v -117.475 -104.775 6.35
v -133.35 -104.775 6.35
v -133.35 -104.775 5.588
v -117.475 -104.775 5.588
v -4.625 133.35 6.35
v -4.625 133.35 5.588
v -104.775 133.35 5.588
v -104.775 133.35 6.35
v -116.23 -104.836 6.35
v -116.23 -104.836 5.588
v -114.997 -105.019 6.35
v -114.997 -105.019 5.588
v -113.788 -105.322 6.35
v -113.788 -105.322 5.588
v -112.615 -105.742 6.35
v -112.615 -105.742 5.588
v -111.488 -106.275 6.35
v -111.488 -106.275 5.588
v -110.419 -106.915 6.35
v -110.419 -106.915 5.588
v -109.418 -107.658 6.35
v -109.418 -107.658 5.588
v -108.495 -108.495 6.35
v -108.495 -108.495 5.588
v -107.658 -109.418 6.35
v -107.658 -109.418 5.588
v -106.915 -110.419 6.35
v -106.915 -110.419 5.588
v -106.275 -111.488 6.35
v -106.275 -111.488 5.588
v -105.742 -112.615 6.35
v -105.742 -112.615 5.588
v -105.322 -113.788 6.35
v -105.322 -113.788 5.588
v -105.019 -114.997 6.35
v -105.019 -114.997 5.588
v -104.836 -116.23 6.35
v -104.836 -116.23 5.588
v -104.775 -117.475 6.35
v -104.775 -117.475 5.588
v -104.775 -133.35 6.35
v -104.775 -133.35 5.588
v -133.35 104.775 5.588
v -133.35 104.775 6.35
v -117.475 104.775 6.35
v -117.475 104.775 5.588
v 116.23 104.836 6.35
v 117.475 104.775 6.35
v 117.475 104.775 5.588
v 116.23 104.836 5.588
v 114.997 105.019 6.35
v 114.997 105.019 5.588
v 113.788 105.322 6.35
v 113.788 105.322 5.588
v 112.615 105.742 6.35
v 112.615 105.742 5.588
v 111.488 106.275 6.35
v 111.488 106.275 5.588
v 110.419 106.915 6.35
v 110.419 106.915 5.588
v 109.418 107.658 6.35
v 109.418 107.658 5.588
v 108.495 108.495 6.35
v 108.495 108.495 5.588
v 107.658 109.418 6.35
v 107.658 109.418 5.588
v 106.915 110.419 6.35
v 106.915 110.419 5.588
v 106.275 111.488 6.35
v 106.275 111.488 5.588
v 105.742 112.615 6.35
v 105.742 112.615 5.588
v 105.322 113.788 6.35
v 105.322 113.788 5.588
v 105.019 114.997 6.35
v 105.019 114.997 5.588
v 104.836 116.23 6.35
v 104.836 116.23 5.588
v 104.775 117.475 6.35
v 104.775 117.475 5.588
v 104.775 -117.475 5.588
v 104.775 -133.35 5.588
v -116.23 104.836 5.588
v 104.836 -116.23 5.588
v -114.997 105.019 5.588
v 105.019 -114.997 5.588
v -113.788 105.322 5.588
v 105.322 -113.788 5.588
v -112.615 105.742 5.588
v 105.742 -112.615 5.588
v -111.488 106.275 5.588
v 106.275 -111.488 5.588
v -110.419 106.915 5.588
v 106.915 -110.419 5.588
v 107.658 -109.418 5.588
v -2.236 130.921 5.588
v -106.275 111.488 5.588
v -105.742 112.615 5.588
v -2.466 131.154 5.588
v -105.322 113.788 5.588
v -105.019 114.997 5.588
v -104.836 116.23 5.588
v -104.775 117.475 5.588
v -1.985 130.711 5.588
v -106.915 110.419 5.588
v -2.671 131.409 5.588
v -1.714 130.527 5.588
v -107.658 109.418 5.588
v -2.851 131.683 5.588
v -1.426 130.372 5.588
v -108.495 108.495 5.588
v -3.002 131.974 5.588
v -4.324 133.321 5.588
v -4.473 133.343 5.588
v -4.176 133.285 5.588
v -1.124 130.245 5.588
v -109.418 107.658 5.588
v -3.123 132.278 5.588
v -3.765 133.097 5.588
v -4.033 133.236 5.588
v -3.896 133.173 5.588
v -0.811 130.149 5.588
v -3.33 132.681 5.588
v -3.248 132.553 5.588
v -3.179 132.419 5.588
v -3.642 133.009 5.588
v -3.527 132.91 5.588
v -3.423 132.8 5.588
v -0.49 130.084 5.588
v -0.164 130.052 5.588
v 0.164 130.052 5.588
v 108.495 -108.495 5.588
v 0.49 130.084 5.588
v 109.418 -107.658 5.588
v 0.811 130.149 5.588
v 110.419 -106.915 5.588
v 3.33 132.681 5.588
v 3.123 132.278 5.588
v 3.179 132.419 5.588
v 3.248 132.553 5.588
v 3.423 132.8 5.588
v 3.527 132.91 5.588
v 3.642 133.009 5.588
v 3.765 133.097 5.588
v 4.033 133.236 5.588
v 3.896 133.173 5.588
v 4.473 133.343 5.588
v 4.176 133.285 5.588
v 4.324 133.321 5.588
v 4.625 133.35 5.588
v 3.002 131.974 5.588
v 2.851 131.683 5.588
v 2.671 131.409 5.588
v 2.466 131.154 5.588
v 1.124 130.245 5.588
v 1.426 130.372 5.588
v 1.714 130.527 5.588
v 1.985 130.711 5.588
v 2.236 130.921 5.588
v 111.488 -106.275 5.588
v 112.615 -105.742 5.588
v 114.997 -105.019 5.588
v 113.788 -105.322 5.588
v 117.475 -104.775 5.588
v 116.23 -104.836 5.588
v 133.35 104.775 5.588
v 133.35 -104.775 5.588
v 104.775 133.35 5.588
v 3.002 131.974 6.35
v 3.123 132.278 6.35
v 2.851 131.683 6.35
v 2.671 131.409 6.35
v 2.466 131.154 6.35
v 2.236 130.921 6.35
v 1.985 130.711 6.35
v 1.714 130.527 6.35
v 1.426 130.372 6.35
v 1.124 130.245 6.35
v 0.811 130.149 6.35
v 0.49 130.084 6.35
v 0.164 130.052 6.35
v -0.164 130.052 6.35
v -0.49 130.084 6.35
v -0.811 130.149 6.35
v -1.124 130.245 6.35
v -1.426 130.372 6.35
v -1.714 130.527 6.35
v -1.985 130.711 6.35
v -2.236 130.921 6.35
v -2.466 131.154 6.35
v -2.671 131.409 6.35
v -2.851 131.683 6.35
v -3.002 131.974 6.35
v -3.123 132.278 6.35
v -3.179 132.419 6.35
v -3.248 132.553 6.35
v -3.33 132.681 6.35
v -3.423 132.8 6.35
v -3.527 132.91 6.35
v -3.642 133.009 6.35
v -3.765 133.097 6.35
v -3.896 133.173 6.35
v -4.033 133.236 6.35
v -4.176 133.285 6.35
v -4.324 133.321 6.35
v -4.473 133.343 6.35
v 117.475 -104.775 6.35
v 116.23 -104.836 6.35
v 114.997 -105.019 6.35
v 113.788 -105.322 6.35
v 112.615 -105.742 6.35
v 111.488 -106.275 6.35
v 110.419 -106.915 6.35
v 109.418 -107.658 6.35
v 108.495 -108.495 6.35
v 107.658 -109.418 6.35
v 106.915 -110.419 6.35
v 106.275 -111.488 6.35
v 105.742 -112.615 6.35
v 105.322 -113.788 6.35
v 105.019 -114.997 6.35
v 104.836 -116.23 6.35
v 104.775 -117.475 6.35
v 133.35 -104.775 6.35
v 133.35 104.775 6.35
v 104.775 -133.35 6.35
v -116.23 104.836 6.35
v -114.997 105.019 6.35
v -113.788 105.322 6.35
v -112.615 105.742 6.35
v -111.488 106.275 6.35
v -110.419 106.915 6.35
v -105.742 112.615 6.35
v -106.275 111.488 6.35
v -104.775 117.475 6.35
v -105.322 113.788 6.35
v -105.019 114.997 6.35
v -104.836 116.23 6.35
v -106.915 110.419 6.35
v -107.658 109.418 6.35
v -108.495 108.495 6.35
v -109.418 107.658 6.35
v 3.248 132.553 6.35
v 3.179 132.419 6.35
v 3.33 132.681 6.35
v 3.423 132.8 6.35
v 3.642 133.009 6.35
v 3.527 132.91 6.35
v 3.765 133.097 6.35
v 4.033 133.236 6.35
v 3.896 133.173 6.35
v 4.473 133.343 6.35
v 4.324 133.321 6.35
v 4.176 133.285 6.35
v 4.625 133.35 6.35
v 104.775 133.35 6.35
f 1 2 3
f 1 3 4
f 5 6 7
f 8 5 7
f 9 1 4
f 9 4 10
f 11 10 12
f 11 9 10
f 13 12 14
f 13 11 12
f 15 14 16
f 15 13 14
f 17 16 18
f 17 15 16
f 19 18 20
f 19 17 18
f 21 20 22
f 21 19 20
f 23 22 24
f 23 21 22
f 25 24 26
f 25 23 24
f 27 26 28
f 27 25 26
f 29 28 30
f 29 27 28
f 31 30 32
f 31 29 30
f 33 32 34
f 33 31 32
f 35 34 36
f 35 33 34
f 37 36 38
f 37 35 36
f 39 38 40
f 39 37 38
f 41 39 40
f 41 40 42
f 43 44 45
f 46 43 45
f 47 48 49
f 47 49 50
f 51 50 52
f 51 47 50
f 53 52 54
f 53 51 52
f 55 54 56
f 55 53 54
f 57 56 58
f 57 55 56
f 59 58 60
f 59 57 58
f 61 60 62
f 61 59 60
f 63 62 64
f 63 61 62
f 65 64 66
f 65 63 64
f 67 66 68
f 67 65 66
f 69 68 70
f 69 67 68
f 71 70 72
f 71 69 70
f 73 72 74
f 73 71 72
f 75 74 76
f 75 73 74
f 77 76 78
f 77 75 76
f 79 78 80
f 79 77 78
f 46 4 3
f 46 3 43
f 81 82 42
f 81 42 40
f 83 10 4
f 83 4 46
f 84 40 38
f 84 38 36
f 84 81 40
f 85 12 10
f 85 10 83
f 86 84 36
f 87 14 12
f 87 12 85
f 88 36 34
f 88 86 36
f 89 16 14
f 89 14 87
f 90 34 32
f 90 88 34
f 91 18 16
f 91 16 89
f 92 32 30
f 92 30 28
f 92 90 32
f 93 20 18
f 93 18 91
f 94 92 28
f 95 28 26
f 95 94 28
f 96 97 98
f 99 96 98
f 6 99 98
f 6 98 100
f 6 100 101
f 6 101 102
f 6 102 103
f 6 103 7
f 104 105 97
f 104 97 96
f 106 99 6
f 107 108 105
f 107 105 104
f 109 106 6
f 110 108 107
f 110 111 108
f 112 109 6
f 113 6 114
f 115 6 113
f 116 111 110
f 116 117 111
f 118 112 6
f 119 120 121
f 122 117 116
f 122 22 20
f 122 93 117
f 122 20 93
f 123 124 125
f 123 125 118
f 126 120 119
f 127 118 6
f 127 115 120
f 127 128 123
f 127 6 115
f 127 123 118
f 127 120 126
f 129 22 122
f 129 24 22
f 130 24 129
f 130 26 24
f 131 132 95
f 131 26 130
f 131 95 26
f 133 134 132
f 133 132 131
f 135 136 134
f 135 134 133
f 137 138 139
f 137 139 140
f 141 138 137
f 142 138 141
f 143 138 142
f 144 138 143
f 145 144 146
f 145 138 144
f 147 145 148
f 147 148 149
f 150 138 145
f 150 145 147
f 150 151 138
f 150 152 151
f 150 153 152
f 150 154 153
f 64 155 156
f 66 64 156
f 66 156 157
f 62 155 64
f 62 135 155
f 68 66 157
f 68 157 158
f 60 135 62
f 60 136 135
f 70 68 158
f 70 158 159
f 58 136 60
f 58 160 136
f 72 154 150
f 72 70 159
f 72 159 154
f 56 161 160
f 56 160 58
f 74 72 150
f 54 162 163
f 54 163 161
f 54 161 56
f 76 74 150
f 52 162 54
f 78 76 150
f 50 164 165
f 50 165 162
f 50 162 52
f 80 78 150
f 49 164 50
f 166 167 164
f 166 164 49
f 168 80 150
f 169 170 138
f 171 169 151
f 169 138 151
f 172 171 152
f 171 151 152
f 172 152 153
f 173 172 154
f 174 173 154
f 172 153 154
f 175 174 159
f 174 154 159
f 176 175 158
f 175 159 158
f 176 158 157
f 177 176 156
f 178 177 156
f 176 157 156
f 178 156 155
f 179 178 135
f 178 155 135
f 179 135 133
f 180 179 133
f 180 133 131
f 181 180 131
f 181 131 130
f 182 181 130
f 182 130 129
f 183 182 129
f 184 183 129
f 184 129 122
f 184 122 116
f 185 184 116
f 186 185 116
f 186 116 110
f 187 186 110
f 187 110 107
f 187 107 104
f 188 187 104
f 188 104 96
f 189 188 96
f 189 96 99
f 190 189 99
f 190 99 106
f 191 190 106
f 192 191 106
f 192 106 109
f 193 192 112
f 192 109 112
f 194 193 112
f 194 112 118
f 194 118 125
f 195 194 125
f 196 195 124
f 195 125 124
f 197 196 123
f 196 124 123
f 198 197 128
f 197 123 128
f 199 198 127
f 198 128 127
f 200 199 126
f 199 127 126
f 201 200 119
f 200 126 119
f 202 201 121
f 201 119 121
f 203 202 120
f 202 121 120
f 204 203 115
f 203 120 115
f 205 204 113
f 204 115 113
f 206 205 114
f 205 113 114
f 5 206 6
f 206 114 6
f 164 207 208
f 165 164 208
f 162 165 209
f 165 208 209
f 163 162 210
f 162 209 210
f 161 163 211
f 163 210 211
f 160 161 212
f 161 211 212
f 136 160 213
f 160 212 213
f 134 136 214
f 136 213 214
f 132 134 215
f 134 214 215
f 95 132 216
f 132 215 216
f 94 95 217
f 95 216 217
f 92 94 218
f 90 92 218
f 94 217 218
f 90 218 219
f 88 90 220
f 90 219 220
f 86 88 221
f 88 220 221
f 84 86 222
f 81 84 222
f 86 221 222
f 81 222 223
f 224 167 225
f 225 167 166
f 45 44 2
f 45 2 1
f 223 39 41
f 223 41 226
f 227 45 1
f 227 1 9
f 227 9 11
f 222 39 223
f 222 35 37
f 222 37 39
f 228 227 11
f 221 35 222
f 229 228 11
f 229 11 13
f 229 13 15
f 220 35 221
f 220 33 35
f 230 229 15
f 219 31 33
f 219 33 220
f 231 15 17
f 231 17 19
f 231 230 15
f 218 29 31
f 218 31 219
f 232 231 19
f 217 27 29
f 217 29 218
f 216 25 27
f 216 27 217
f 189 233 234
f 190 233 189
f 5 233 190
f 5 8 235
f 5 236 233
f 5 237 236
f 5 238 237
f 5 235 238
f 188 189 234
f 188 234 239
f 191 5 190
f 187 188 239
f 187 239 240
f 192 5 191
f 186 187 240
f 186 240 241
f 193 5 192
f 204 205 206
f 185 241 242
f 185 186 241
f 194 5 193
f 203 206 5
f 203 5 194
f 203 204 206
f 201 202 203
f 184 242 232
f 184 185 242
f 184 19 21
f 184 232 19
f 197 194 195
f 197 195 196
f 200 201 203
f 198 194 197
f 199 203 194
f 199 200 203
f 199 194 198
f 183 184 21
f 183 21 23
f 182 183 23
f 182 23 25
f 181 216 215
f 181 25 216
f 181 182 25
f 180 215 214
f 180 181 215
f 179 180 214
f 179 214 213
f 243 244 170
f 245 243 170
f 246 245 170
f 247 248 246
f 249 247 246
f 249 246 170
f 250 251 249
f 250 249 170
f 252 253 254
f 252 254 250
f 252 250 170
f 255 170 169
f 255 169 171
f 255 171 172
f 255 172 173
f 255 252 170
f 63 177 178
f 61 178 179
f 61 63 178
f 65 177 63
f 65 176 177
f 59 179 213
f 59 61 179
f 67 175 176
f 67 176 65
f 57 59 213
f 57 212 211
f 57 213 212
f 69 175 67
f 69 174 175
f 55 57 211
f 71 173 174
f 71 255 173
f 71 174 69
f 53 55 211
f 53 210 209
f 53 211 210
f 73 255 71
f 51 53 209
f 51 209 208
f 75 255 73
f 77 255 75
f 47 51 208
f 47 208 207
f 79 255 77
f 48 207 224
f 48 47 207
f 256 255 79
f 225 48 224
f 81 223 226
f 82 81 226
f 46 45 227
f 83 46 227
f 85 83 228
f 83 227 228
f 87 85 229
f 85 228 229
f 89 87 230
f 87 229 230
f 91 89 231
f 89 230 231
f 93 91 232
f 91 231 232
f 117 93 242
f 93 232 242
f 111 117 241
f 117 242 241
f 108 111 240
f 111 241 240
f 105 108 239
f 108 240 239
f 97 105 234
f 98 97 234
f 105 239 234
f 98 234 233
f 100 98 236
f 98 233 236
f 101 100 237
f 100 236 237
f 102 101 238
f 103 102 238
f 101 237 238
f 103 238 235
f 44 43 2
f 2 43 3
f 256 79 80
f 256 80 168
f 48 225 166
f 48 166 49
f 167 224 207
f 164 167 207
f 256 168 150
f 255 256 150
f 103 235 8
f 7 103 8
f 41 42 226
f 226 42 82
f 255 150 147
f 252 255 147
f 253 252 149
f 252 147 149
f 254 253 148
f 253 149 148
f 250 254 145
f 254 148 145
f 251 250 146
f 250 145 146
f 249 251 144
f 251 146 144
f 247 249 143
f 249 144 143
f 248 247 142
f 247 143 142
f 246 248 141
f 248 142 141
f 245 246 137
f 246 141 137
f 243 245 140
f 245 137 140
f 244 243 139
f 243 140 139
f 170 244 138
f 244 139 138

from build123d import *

# Parameters (mm, degrees)
FE_00082_OUTLINE_R = 3.3782
FE_00082_DEPTH     = 6.35
SKETCH1_W          = 5.588
SKETCH1_H          = 266.7
CUT_EXTRUDE1_DEPTH = 299.247271572
CUT_EXTRUDE2_DEPTH = 189.586918009


# Read off the part's stored shape, not the designer's step: FE-00082
with BuildPart() as part:
    # FE-00082 outline → FE-00082 (new body)
    with BuildSketch(Plane.XY):
        with BuildLine():
            Line((127, 133.35), (4.62461393, 133.35))
            ThreePointArc((4.62461393, 133.35), (3.702137995, 133.054473064), (3.123115901, 132.277922078))
            ThreePointArc((3.123115901, 132.277922078), (0, 130.048), (-3.123115901, 132.277922078))
            ThreePointArc((-3.123115901, 132.277922078), (-3.702137995, 133.054473064), (-4.62461393, 133.35))
            Line((-4.62461393, 133.35), (-127, 133.35))
            ThreePointArc((-127, 133.35), (-131.490128061, 131.490128061), (-133.35, 127))
            Line((-133.35, 127), (-133.35, -127))
            ThreePointArc((-133.35, -127), (-131.490128061, -131.490128061), (-127, -133.35))
            Line((-127, -133.35), (127, -133.35))
            ThreePointArc((127, -133.35), (131.490128061, -131.490128061), (133.35, -127))
            Line((133.35, -127), (133.35, 127))
            ThreePointArc((133.35, 127), (131.490128061, 131.490128061), (127, 133.35))
        make_face()
        with Locations((-117.475, -117.475)):
            Circle(FE_00082_OUTLINE_R, mode=Mode.SUBTRACT)
        with Locations((117.475, -117.475)):
            Circle(FE_00082_OUTLINE_R, mode=Mode.SUBTRACT)
        with Locations((-117.475, 117.475)):
            Circle(FE_00082_OUTLINE_R, mode=Mode.SUBTRACT)
        with Locations((117.475, 117.475)):
            Circle(FE_00082_OUTLINE_R, mode=Mode.SUBTRACT)
    extrude(amount=FE_00082_DEPTH)

    # Sketch1 → Cut-Extrude1 (cut, through all)
    with BuildSketch(Plane(origin=(133.35, 0, 0), x_dir=(0, 0, -1), z_dir=(1, 0, 0))):
        with Locations((-2.794, 0)):
            Rectangle(SKETCH1_W, SKETCH1_H)
    extrude(amount=-CUT_EXTRUDE1_DEPTH, mode=Mode.SUBTRACT)

    # Sketch2 → Cut-Extrude2 (cut, through all)
    with BuildSketch(Plane.XY.offset(6.35)):
        with BuildLine():
            Line((-133.35, 104.775), (-117.475, 104.775))
            ThreePointArc((-117.475, 104.775), (-108.494743879, 108.494743879), (-104.775, 117.475))
            Line((-104.775, 117.475), (-104.775, 133.35))
            Line((-104.775, 133.35), (-127, 133.35))
            ThreePointArc((-127, 133.35), (-131.490128061, 131.490128061), (-133.35, 127))
            Line((-133.35, 127), (-133.35, 104.775))
        make_face()
        with BuildLine():
            Line((-104.775, -133.35), (-127, -133.35))
            ThreePointArc((-127, -133.35), (-131.490128061, -131.490128061), (-133.35, -127))
            Line((-133.35, -127), (-133.35, -104.775))
            Line((-133.35, -104.775), (-117.475, -104.775))
            ThreePointArc((-117.475, -104.775), (-108.494743879, -108.494743879), (-104.775, -117.475))
            Line((-104.775, -117.475), (-104.775, -133.35))
        make_face()
        with BuildLine():
            Line((133.35, -104.775), (117.475, -104.775))
            ThreePointArc((117.475, -104.775), (108.494743879, -108.494743879), (104.775, -117.475))
            Line((104.775, -117.475), (104.775, -133.35))
            Line((104.775, -133.35), (127, -133.35))
            ThreePointArc((127, -133.35), (131.490128061, -131.490128061), (133.35, -127))
            Line((133.35, -127), (133.35, -104.775))
        make_face()
        with BuildLine():
            Line((104.775, 133.35), (127, 133.35))
            ThreePointArc((127, 133.35), (131.490128061, 131.490128061), (133.35, 127))
            Line((133.35, 127), (133.35, 104.775))
            Line((133.35, 104.775), (117.475, 104.775))
            ThreePointArc((117.475, 104.775), (108.494743879, 108.494743879), (104.775, 117.475))
            Line((104.775, 117.475), (104.775, 133.35))
        make_face()
    extrude(amount=-CUT_EXTRUDE2_DEPTH, mode=Mode.SUBTRACT)


solid = part.part
